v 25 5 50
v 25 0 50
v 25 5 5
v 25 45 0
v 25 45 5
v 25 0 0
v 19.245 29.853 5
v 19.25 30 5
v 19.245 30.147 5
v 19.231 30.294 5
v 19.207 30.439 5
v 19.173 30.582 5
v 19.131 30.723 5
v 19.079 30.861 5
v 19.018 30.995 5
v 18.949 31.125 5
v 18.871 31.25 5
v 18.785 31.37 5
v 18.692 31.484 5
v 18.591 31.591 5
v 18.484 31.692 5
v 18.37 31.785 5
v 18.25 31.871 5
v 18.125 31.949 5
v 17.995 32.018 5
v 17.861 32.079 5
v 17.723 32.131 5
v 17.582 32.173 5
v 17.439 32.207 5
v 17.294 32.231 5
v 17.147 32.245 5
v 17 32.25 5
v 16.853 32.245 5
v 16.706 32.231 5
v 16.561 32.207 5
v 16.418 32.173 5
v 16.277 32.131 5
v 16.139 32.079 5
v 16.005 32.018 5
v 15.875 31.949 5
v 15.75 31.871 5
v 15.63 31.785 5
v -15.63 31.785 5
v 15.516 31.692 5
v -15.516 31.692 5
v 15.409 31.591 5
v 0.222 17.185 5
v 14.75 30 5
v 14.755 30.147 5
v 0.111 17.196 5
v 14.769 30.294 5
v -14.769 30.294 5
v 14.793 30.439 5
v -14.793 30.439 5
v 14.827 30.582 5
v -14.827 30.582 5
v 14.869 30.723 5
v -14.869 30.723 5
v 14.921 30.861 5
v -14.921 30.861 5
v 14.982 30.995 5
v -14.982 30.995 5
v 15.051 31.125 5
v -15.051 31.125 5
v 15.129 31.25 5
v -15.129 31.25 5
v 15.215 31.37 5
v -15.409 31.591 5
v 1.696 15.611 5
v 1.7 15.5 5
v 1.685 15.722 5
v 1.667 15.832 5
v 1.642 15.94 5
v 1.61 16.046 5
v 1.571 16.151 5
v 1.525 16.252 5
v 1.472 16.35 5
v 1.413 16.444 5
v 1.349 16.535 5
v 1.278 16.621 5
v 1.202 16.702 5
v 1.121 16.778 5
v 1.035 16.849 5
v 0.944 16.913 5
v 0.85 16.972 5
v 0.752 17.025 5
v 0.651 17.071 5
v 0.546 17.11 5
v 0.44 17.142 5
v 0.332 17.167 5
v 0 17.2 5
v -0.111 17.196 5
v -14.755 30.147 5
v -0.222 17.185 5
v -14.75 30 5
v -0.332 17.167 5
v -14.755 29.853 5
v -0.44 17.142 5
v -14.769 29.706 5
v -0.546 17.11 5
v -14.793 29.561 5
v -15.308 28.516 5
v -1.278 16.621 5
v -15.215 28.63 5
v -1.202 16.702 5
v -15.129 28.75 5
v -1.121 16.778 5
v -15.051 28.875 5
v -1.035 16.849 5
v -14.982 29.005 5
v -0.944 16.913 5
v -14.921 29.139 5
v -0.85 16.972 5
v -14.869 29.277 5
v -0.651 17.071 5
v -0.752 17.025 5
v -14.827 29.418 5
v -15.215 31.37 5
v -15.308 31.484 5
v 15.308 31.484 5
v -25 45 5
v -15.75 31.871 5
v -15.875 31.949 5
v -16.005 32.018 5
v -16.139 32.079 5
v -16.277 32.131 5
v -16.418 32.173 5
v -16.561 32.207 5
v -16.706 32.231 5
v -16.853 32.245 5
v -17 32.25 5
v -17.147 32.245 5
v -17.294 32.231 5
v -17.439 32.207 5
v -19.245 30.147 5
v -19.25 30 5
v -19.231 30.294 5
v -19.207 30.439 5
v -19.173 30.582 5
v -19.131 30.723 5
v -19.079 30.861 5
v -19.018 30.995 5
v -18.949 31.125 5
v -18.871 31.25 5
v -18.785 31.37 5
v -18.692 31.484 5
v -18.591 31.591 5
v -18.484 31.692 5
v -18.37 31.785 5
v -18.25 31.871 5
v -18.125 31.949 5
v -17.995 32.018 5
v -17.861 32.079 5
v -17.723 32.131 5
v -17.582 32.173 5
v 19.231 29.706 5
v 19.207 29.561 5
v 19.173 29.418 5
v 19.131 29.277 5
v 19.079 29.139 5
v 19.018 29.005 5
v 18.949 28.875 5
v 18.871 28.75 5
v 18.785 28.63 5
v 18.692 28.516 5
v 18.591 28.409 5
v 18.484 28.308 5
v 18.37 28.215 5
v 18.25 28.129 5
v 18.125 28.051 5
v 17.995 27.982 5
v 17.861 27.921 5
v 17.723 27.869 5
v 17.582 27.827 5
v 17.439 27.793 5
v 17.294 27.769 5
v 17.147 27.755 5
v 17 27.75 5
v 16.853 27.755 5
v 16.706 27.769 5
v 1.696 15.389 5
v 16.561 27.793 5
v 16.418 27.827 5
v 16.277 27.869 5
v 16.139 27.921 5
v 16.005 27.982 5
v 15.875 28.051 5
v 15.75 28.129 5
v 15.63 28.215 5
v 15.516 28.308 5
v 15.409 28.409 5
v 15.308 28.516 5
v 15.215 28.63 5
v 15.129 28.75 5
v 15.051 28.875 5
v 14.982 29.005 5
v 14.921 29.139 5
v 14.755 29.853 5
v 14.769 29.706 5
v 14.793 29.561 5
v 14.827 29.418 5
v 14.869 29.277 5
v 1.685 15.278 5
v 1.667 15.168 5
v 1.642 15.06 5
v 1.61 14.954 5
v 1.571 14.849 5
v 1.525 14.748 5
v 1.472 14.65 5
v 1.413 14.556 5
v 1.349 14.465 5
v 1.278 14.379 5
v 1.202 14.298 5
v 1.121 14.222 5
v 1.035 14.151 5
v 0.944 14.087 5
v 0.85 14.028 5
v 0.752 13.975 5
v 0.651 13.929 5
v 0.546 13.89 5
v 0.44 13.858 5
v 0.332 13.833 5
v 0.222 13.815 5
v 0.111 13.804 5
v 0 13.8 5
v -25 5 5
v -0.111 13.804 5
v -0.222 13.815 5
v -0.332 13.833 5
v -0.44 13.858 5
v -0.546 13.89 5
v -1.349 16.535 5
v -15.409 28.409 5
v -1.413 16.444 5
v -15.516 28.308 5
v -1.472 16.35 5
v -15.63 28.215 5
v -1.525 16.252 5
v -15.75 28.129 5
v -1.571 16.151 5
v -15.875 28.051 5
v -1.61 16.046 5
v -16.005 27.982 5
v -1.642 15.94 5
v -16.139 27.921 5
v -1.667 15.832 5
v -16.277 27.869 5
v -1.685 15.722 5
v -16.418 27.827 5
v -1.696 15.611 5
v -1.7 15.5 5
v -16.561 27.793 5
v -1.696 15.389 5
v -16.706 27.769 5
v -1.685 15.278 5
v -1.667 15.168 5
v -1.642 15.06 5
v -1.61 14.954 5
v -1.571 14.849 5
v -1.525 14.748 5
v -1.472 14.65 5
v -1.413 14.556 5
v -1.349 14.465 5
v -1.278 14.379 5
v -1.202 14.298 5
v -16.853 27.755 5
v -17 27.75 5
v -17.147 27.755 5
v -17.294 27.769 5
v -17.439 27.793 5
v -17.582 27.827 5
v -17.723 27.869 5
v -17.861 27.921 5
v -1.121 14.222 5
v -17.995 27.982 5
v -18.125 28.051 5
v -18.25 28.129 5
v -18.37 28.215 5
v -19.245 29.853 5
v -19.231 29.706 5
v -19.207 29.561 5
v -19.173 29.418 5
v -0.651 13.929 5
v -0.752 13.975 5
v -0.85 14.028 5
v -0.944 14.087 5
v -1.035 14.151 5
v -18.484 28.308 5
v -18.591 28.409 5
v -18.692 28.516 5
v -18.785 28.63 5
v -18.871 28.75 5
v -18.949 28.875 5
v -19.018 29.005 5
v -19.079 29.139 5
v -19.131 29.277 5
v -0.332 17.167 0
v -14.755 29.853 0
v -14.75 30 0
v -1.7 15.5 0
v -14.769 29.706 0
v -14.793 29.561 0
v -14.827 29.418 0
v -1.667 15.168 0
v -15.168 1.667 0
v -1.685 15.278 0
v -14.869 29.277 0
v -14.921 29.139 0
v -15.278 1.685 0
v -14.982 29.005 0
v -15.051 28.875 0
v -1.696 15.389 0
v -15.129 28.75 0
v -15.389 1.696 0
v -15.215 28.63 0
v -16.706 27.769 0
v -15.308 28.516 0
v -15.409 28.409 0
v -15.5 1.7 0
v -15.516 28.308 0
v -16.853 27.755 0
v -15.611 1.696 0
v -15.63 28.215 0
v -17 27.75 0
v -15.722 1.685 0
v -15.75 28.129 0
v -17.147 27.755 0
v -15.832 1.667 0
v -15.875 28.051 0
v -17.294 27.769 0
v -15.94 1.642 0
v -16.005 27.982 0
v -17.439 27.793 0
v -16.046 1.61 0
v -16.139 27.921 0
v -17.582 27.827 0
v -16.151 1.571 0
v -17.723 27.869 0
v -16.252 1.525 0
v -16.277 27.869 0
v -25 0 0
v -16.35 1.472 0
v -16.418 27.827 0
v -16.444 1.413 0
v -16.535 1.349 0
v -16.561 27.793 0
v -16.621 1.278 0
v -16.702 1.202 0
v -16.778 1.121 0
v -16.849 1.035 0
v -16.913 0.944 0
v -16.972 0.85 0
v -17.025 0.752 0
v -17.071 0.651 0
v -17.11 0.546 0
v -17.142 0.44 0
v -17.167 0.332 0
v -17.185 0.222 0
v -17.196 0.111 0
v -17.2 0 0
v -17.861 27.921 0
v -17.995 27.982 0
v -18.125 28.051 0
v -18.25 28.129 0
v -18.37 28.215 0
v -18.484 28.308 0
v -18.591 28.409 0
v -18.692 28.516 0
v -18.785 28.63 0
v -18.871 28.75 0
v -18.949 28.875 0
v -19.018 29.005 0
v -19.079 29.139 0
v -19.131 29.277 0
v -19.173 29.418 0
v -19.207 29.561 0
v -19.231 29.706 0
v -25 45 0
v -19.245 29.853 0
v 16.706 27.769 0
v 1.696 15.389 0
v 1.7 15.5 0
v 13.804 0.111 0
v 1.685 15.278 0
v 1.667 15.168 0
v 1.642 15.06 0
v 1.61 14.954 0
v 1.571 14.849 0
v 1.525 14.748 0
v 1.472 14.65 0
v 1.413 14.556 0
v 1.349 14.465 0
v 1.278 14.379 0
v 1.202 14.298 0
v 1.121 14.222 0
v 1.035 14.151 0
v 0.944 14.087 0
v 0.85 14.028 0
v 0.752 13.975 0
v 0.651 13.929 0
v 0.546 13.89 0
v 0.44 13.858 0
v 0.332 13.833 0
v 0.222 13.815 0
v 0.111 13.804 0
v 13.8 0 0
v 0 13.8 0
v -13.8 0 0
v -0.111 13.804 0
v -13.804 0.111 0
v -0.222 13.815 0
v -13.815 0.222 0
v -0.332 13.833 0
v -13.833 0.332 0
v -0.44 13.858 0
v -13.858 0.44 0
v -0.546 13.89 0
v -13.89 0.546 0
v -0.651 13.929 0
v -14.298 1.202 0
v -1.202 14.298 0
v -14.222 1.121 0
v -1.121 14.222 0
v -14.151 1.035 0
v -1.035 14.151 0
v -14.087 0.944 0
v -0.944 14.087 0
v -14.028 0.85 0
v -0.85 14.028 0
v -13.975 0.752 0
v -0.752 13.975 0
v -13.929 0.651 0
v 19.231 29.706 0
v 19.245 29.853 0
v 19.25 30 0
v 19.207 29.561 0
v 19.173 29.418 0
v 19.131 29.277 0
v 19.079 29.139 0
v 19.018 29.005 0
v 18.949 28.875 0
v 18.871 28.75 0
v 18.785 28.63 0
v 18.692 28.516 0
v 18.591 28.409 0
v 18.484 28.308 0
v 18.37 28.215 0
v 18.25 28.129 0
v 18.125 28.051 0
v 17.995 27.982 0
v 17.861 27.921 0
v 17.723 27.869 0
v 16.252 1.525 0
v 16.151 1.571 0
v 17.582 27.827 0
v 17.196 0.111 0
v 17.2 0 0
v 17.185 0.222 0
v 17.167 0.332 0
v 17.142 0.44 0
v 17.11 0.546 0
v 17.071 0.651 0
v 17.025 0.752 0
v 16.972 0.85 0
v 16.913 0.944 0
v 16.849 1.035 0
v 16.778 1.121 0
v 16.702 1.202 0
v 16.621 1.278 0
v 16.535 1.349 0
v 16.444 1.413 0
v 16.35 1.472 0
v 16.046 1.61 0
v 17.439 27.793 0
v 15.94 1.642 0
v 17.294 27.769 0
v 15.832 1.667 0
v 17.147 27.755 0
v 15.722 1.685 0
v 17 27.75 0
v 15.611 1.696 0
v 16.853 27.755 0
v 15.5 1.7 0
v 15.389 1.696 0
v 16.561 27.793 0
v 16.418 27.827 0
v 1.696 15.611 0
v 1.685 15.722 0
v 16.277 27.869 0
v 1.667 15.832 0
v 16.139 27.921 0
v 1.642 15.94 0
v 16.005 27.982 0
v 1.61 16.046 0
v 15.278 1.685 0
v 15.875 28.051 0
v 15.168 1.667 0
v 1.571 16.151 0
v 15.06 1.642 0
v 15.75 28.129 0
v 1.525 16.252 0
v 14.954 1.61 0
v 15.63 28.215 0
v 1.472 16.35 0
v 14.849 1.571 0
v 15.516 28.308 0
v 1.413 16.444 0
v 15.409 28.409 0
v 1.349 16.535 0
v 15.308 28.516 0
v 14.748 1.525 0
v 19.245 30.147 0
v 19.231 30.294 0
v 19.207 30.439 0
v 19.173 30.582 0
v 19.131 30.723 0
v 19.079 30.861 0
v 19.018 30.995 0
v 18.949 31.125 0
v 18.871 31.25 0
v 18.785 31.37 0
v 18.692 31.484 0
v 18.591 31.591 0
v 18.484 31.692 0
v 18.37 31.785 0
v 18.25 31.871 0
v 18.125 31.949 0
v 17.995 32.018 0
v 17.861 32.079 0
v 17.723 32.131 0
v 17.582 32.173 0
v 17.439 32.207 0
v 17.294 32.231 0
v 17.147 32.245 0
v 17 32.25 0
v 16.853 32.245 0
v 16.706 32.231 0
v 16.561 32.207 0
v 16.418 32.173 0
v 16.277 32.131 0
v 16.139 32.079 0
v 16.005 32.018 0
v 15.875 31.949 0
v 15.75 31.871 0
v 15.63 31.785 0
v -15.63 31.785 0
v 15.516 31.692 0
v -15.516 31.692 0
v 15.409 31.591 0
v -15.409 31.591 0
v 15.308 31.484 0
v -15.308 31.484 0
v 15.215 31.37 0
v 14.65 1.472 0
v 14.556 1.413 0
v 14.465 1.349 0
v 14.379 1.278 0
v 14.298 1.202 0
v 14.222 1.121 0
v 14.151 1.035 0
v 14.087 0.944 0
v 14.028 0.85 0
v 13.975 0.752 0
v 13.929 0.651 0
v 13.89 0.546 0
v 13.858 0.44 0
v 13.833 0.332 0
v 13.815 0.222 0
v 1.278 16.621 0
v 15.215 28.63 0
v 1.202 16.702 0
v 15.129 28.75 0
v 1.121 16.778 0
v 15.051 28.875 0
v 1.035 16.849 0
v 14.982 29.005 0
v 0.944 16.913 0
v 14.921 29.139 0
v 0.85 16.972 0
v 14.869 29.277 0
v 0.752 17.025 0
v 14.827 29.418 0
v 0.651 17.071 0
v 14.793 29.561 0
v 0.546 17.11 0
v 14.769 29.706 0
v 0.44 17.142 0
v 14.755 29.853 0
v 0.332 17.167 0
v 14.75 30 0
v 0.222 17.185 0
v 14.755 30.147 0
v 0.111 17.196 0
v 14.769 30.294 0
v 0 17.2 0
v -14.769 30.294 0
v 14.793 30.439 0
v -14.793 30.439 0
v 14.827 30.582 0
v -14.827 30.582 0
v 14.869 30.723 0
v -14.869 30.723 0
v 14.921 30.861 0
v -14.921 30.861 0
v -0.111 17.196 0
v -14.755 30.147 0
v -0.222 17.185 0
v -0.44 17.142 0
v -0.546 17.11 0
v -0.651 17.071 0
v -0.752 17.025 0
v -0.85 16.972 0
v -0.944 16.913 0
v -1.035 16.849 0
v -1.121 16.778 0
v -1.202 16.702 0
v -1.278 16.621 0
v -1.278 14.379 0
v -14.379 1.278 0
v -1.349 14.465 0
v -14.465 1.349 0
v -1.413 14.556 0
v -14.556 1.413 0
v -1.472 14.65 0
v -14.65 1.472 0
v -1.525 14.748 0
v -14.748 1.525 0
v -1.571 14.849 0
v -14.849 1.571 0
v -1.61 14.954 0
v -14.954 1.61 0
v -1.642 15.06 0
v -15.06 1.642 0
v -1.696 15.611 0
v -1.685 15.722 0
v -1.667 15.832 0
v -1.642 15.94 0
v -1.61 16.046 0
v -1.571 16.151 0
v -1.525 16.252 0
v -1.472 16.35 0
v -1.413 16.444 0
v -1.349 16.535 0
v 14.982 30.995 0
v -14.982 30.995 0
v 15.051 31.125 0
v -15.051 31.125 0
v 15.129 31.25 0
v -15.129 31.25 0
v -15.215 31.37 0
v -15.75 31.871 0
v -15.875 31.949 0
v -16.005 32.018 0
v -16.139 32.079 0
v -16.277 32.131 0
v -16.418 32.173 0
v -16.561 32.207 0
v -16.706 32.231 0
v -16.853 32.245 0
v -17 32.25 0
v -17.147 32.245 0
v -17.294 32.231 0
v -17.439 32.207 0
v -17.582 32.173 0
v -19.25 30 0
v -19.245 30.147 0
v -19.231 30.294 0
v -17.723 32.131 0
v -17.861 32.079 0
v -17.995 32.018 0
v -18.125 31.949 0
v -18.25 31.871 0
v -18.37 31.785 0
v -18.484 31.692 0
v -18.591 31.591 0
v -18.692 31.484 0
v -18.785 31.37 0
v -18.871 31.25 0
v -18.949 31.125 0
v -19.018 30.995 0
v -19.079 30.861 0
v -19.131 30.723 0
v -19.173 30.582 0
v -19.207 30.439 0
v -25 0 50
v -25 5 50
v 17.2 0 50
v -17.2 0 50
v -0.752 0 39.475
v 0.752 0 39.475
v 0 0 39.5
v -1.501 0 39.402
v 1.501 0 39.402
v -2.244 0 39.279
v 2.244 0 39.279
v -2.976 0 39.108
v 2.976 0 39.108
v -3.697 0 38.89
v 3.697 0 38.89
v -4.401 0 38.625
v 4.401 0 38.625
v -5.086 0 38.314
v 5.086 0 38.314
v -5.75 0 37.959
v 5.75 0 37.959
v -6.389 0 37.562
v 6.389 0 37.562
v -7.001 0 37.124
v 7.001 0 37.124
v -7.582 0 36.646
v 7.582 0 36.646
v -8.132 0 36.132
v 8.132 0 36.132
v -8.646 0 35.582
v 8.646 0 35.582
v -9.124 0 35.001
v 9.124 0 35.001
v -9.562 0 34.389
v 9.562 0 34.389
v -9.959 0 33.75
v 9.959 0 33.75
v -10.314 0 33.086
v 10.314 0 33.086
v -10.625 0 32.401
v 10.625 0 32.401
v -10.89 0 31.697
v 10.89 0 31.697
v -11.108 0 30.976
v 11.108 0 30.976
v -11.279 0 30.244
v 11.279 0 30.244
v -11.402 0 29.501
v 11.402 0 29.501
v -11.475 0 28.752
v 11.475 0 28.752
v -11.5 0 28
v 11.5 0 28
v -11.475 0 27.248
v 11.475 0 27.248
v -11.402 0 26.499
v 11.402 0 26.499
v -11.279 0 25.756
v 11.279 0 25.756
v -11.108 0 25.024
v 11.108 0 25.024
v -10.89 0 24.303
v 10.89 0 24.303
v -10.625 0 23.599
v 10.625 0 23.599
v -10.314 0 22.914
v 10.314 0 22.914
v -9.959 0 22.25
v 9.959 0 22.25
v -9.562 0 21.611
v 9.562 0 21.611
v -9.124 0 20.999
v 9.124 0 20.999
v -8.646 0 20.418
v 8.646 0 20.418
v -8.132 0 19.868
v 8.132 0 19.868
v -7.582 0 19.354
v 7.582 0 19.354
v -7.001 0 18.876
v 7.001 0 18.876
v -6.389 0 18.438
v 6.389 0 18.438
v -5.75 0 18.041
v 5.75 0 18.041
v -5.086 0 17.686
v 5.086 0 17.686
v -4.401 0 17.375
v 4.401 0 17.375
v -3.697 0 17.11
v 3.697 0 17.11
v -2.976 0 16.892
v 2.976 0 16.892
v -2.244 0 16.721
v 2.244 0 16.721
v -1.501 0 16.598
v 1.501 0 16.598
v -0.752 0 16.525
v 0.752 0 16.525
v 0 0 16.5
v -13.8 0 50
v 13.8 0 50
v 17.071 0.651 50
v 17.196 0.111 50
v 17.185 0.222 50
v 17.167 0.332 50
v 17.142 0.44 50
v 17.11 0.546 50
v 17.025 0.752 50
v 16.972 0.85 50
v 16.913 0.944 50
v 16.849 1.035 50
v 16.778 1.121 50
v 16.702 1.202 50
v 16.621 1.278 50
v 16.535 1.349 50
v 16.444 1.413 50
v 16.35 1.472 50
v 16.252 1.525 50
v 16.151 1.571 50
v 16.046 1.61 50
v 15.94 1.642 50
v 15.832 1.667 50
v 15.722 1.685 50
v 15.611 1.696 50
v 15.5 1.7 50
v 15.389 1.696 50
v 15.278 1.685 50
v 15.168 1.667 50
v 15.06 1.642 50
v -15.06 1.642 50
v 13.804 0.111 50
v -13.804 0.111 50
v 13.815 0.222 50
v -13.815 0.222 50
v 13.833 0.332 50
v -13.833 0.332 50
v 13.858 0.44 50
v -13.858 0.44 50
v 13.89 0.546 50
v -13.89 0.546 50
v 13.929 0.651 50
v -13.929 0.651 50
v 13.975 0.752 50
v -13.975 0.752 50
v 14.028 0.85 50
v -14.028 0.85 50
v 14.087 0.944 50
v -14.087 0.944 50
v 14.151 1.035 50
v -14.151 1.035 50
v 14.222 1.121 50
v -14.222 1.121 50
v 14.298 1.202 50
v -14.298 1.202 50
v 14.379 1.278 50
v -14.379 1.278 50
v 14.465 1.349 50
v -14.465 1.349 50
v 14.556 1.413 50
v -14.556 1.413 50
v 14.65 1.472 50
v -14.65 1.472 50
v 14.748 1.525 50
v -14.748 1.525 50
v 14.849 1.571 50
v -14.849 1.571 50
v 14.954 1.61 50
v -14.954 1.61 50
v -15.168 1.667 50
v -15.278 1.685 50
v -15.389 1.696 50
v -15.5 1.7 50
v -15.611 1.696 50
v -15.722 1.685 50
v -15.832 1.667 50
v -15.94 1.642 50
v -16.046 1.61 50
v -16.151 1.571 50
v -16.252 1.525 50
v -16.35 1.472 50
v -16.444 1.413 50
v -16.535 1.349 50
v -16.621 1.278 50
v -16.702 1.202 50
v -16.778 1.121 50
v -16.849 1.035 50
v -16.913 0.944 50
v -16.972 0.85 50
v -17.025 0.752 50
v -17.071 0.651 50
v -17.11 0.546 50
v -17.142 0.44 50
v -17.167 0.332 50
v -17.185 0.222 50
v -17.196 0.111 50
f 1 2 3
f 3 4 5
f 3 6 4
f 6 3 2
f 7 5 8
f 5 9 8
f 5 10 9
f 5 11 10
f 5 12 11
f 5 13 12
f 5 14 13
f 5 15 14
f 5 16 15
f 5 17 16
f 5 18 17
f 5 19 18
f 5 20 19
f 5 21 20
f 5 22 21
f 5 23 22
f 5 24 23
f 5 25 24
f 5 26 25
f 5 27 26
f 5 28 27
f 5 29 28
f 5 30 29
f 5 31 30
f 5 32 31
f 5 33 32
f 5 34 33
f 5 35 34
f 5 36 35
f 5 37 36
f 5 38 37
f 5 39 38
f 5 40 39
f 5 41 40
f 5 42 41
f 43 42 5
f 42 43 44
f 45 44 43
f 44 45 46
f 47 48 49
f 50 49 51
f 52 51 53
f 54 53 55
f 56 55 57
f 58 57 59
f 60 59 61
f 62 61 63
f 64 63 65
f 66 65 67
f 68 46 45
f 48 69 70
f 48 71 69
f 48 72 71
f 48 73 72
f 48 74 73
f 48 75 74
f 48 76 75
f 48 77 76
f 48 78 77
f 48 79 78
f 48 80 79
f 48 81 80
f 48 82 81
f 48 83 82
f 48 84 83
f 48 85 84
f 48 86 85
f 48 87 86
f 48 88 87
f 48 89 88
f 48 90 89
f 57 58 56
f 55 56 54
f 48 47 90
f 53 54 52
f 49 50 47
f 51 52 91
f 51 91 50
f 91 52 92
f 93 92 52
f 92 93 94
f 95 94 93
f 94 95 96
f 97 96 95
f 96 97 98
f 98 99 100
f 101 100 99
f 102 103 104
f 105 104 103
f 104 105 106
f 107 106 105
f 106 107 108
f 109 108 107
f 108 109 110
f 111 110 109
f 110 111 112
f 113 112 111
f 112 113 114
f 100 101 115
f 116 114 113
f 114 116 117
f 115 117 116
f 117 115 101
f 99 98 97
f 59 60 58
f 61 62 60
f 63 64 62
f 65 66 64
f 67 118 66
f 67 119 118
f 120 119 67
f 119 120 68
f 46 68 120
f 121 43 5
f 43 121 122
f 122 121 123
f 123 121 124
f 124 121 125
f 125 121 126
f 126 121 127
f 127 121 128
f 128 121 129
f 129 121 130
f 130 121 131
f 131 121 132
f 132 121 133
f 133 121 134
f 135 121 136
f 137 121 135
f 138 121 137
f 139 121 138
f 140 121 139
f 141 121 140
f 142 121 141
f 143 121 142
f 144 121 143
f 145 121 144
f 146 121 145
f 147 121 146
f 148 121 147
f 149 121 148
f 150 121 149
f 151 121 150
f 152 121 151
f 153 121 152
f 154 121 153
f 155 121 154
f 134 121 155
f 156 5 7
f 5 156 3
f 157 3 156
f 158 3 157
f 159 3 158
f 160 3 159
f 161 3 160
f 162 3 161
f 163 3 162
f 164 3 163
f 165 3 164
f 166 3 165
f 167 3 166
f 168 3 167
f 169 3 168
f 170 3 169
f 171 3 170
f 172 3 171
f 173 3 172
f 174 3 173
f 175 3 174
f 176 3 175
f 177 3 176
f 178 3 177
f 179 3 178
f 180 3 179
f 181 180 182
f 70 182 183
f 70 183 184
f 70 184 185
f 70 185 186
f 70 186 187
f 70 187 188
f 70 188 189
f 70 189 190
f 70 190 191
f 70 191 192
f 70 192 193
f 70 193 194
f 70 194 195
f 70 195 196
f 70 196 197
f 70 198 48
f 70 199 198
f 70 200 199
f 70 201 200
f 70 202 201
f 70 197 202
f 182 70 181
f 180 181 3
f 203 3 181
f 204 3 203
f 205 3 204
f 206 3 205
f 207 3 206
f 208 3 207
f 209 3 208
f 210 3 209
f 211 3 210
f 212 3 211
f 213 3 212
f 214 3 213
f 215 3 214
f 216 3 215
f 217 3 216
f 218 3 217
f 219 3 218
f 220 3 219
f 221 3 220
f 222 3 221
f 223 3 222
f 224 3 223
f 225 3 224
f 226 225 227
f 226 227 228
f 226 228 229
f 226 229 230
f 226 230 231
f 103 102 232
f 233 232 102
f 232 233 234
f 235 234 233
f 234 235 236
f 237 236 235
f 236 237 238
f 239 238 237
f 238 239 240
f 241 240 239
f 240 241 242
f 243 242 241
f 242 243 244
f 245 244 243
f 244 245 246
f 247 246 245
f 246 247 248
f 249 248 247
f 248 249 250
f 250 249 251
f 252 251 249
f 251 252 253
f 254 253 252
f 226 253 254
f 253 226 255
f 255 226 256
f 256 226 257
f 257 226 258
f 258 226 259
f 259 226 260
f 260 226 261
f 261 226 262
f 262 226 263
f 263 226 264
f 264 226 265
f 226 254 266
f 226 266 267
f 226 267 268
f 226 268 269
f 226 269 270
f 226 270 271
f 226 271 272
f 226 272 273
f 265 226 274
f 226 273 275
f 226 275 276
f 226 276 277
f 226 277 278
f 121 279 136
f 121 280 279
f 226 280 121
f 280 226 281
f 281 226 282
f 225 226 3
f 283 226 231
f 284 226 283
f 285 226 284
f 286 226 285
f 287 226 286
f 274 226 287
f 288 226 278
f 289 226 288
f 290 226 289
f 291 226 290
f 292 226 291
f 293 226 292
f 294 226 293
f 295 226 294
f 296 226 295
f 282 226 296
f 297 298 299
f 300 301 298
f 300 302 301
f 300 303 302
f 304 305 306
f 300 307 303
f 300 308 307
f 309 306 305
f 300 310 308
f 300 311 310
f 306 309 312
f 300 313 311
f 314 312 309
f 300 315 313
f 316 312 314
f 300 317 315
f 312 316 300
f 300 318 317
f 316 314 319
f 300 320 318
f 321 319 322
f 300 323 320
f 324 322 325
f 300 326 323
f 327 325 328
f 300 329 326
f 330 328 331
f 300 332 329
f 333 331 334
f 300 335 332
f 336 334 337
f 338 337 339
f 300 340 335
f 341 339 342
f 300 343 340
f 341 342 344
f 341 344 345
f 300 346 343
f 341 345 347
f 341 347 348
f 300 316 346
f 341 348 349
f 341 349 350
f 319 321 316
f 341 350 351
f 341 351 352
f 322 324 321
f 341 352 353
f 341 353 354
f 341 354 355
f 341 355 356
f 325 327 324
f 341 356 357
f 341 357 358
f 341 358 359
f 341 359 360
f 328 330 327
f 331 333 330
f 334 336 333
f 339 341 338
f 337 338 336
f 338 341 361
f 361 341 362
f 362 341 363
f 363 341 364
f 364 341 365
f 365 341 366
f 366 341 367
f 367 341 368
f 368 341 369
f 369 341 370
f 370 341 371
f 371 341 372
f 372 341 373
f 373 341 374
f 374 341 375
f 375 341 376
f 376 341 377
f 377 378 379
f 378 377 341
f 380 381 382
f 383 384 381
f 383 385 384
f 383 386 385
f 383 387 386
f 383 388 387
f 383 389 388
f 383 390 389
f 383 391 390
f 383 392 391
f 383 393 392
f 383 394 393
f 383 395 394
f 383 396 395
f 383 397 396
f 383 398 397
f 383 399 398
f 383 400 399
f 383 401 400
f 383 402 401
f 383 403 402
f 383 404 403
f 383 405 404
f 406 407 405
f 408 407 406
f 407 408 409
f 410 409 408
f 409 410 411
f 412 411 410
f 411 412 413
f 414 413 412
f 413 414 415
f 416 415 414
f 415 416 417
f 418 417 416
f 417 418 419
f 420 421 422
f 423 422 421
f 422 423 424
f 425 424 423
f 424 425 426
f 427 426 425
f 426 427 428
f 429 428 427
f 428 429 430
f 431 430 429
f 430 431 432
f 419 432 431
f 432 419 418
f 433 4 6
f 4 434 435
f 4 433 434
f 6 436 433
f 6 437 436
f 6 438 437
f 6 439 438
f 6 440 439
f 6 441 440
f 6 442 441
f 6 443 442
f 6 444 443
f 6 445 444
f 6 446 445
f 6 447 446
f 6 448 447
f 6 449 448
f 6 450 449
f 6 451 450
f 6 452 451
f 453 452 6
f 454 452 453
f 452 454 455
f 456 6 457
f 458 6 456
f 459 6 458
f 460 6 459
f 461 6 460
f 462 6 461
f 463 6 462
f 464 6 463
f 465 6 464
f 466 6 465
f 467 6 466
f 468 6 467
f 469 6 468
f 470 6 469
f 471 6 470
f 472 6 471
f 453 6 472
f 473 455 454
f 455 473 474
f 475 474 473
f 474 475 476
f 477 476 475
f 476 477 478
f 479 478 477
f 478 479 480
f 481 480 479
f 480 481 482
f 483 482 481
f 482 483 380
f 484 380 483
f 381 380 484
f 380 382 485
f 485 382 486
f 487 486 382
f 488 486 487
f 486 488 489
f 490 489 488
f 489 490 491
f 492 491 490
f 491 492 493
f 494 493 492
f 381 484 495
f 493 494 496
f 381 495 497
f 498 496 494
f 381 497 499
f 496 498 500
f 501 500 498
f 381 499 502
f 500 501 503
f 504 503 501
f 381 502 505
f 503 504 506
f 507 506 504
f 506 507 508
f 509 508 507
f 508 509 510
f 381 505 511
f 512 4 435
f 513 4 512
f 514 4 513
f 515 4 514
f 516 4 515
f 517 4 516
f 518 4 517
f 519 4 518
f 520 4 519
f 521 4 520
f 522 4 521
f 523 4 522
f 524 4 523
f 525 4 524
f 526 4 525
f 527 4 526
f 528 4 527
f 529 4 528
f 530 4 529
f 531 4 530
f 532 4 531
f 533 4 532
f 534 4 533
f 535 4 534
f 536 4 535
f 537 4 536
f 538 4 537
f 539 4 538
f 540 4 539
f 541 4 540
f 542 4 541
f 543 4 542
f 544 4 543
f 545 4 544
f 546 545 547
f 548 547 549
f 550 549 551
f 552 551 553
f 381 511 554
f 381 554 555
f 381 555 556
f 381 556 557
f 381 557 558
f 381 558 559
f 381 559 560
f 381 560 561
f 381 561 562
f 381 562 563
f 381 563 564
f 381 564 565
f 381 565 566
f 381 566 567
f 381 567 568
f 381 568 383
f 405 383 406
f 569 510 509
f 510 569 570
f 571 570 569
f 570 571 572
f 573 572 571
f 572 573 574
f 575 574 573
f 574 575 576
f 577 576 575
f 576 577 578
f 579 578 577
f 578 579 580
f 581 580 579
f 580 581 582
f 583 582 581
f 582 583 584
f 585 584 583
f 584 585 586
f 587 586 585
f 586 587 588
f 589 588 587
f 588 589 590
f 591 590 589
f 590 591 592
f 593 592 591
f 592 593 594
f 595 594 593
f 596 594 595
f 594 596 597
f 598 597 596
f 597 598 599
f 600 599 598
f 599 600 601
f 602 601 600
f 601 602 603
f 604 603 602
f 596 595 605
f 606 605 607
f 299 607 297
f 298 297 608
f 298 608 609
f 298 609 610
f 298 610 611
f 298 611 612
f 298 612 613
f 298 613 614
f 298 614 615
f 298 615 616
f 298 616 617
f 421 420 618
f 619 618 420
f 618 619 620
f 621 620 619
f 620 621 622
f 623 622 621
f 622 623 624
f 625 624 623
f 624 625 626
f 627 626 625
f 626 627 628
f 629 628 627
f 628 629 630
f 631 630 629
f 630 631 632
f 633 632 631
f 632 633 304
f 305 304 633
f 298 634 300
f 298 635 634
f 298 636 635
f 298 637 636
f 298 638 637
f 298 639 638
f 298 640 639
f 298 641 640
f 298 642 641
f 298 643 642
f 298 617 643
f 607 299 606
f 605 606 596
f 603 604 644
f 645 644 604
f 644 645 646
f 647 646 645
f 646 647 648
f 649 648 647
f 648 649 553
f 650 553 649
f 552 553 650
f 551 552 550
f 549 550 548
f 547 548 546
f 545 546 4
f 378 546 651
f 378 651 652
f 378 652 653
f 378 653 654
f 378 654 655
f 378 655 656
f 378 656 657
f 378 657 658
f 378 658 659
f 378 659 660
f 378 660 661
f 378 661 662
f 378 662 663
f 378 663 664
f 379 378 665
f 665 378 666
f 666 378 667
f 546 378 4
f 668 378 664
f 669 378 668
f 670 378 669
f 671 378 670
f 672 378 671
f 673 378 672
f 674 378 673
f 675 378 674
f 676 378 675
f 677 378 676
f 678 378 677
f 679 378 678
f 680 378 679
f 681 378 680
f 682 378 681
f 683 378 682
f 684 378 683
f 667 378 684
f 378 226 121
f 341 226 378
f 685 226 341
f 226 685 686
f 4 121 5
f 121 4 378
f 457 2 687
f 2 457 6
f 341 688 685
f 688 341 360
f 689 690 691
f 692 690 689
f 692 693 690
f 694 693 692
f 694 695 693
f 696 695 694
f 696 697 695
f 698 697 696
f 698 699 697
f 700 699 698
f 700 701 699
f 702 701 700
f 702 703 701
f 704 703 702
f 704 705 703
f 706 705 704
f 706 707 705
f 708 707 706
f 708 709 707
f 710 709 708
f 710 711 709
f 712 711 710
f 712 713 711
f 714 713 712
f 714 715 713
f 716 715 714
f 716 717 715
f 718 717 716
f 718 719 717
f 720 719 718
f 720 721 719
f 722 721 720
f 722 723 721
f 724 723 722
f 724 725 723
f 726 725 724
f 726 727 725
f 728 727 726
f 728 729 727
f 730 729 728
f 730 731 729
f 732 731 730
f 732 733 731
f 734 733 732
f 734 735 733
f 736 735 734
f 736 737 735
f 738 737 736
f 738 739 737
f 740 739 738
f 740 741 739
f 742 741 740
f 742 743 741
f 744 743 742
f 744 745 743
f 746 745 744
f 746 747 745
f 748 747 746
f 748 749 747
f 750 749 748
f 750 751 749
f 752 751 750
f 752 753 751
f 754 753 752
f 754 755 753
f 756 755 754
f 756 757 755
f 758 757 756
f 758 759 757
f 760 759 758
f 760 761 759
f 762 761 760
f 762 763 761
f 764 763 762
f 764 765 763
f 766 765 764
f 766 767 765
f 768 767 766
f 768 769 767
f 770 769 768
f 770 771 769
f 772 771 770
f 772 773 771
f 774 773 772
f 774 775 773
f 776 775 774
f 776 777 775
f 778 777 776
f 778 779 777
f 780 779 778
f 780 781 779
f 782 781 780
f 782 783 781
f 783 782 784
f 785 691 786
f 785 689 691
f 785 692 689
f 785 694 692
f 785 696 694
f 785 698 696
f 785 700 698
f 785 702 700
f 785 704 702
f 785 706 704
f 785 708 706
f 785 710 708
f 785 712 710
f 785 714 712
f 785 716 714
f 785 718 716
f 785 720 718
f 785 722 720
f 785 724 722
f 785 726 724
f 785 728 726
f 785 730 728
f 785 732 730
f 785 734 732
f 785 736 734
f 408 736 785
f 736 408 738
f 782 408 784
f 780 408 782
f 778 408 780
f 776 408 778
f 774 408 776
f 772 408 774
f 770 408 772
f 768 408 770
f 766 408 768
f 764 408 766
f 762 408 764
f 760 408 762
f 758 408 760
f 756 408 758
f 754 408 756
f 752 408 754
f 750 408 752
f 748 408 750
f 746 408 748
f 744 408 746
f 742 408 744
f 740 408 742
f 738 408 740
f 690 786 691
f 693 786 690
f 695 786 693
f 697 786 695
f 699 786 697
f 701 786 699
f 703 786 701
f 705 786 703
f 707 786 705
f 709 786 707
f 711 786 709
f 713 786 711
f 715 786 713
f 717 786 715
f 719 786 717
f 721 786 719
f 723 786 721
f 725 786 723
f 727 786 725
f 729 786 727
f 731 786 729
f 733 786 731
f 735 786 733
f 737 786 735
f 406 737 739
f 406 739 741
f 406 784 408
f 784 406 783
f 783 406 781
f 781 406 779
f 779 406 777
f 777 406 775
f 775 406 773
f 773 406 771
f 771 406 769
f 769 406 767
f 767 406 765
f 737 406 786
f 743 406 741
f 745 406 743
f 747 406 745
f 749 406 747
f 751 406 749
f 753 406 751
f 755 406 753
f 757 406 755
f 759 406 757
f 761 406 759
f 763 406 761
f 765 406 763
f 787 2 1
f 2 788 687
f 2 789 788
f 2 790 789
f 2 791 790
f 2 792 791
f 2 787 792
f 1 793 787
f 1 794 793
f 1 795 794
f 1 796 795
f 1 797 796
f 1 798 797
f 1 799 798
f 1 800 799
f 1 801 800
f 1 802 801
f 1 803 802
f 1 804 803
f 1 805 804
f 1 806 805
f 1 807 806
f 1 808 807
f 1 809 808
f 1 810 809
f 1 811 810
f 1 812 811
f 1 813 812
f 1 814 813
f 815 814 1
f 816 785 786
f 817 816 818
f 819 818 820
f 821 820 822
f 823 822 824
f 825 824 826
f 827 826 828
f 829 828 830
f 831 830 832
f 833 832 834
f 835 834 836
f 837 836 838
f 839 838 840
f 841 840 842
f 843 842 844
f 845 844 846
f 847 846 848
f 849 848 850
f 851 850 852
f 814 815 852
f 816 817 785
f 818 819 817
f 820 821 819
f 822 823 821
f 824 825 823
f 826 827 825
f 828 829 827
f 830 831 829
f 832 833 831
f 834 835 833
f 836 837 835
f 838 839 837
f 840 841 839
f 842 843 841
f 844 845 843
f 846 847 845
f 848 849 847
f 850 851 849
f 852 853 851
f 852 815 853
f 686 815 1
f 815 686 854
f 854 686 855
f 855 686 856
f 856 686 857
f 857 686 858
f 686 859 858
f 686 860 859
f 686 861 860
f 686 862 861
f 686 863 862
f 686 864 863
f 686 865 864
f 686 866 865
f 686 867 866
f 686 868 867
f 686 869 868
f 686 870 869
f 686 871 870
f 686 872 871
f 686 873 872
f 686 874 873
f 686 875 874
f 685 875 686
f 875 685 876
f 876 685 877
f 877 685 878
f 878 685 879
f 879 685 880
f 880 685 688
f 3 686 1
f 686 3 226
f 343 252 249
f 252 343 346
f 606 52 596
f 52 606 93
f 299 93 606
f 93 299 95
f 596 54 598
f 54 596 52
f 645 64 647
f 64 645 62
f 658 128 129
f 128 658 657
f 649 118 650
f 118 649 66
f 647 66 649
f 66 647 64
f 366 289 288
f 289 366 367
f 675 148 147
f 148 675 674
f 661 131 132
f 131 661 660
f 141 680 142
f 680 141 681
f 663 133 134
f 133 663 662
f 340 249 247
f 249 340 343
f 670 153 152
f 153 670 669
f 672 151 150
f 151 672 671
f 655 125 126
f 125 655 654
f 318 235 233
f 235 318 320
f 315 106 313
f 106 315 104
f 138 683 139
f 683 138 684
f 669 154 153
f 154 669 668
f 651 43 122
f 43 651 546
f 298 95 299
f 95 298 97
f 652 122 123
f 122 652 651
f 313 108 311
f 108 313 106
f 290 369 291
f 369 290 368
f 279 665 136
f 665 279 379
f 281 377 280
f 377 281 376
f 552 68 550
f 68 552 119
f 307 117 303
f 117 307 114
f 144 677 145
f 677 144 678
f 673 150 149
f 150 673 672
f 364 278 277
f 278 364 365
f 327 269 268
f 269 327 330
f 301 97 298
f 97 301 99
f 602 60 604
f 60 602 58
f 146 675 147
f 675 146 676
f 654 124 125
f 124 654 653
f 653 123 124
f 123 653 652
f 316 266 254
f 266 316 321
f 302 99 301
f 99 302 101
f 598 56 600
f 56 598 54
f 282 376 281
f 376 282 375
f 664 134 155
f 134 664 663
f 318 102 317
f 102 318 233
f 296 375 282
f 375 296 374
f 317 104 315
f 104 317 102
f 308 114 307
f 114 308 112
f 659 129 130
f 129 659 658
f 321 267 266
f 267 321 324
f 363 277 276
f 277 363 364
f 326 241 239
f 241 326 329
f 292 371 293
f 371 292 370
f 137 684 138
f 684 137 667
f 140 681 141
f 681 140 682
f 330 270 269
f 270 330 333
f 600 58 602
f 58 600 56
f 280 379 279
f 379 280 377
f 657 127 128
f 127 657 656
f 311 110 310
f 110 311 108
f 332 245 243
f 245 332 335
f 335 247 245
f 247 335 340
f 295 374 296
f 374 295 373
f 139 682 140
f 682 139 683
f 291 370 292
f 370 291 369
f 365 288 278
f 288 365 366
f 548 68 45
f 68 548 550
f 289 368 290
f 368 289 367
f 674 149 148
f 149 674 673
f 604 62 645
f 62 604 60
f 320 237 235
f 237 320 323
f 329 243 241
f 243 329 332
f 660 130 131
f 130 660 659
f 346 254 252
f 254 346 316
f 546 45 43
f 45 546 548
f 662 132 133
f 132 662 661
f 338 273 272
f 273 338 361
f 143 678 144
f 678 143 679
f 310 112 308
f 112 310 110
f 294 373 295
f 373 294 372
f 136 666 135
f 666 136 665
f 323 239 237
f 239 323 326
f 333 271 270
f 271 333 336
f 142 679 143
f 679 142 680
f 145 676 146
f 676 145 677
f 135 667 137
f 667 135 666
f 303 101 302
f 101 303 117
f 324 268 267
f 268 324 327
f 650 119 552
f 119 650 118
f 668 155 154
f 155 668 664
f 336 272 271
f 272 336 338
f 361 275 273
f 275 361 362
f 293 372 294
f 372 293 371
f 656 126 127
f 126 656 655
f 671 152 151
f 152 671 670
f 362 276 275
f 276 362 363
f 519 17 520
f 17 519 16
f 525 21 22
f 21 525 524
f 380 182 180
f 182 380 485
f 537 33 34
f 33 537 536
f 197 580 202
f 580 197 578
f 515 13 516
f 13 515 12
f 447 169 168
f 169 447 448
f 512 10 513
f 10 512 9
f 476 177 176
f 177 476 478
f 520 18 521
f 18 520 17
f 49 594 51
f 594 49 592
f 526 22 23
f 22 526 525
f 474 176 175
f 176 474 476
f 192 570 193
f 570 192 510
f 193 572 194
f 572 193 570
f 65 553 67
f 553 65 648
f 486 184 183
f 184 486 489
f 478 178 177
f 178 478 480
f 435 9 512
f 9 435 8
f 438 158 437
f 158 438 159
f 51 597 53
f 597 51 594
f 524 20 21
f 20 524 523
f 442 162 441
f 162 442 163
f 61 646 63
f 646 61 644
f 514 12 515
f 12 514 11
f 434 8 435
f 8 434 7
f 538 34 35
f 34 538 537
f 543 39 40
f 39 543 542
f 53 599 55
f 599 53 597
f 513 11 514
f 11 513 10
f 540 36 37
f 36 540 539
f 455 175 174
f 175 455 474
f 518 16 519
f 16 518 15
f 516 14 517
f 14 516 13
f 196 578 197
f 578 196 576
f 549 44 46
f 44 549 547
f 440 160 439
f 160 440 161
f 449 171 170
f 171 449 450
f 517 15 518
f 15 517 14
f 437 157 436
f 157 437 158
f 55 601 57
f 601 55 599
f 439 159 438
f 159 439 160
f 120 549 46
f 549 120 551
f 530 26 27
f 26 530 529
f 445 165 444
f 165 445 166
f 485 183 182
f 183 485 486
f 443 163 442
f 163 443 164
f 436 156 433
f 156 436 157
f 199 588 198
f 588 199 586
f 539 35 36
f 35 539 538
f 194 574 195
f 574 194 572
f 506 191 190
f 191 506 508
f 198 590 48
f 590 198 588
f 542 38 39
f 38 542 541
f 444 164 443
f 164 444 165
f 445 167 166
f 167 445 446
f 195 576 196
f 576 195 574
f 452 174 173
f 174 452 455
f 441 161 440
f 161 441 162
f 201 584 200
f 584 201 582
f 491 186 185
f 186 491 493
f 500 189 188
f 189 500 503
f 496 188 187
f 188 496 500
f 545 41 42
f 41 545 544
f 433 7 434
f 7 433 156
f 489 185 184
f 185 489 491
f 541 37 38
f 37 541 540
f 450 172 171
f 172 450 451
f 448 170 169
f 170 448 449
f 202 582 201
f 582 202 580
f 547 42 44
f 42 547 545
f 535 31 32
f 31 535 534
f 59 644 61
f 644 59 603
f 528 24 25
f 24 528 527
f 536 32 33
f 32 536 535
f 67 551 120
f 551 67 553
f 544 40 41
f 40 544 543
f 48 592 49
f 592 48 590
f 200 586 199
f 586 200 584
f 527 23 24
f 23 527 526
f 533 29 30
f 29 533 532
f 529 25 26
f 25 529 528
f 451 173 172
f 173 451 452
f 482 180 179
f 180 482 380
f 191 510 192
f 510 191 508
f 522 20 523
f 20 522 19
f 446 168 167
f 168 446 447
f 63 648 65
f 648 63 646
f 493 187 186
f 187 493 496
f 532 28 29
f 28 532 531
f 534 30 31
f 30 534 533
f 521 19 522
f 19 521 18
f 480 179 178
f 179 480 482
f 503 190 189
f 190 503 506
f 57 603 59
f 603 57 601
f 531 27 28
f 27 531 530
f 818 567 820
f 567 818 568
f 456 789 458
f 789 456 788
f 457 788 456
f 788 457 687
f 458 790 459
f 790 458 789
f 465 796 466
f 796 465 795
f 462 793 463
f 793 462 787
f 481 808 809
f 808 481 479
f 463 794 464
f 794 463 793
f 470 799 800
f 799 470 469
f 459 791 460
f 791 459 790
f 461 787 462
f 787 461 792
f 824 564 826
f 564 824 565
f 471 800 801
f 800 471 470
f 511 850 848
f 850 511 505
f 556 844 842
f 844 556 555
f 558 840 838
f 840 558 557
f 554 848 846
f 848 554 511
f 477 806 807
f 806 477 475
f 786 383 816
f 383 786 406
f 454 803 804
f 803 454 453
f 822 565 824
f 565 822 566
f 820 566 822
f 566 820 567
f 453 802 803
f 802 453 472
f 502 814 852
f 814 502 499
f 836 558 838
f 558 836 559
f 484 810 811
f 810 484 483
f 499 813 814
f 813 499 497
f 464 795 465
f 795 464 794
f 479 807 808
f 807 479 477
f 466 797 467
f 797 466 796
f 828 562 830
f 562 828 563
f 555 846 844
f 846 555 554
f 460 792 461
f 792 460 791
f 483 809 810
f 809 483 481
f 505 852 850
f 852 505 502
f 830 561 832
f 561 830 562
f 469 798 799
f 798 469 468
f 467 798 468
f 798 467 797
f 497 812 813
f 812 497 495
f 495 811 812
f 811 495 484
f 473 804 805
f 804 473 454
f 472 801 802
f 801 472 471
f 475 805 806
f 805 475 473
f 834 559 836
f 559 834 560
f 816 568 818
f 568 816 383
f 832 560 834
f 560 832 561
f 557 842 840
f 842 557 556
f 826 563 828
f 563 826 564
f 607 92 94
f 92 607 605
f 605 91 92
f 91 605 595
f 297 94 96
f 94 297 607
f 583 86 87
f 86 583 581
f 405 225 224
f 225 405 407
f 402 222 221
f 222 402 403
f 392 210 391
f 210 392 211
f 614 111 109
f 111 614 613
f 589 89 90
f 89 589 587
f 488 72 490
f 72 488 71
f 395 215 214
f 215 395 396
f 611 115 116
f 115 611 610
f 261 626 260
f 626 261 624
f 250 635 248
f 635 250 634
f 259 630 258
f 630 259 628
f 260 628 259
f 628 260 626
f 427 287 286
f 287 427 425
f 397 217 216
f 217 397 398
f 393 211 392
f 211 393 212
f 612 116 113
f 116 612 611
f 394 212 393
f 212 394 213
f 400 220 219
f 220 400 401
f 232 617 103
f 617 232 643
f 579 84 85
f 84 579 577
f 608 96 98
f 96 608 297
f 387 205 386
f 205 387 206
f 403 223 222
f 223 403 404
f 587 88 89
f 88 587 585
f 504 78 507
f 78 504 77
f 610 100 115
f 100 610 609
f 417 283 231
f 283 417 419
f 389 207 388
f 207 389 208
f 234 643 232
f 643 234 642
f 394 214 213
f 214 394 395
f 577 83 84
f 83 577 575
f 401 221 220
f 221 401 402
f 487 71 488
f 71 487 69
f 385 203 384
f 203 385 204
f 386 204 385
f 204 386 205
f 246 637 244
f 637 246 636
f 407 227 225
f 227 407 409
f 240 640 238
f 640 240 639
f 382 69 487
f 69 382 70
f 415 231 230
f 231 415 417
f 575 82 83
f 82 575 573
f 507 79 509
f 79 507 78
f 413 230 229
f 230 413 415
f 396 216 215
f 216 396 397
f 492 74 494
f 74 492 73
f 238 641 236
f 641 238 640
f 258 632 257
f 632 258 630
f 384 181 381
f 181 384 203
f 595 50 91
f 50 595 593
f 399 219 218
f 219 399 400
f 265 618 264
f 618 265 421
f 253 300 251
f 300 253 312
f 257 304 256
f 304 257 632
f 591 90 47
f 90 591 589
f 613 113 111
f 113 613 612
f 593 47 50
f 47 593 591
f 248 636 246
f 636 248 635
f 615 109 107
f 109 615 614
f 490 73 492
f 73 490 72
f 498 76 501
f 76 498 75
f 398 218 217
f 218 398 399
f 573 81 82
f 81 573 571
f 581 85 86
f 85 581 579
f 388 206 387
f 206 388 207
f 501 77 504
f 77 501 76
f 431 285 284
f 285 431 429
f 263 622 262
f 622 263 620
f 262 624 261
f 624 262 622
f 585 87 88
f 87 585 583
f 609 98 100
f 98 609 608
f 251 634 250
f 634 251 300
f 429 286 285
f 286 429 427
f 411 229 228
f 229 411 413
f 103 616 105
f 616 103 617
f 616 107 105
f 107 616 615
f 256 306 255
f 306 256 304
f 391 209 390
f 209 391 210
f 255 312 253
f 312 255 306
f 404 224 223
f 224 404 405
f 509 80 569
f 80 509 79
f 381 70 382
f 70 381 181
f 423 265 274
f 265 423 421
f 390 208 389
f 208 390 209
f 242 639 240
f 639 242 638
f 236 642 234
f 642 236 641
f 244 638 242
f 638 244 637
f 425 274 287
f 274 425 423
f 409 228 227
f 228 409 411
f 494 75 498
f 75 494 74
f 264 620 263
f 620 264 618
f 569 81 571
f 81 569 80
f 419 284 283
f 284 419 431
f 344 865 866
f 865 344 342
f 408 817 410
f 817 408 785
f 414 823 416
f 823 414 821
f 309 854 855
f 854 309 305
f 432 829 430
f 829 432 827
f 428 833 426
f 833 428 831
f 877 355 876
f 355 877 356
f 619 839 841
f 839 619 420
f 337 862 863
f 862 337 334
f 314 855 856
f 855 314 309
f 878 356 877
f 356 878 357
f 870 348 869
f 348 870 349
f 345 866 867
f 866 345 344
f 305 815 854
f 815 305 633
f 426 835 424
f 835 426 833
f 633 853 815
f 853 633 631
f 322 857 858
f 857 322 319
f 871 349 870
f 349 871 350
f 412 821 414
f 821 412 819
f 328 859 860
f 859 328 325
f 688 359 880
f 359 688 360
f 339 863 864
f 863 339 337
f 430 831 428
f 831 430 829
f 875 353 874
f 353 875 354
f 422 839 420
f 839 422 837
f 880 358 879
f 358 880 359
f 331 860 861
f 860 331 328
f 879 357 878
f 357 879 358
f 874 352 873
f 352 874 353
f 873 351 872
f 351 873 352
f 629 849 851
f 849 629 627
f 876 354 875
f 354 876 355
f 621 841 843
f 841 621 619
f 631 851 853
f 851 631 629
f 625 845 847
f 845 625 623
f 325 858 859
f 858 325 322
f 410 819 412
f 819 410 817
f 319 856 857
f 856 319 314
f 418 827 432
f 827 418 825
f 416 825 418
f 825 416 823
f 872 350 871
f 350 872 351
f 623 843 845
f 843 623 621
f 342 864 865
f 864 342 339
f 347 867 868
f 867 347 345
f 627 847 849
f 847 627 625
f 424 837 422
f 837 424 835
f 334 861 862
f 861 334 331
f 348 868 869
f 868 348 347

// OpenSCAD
// L-shaped mounting bracket for a NEMA 17 stepper motor (e.g. syringe pump)
// Print orientation: base plate on the bed (z = 0), motor plate builds upward.

// ---------------- Parameters ----------------
base_x0      = -25;    // base plate, x start
base_x1      = 25;     // base plate, x end
base_y0      = 0;      // base plate, y start
base_y1      = 45;     // base plate, y end
base_z0      = 0;      // base plate, z start
base_z1      = 5;      // base plate, z end

motor_x0     = -25;    // motor plate, x start
motor_x1     = 25;     // motor plate, x end
motor_y0     = 0;      // motor plate, y start
motor_y1     = 5;      // motor plate, y end (stands on back edge of base)
motor_z0     = 0;      // motor plate, z start
motor_z1     = 50;     // motor plate, z end

hole_m4_x1   = -17;    // M4 through-hole in base, x
hole_m4_y1   = 30;     // M4 through-hole in base, y
hole_m4_x2   = 17;     // M4 through-hole in base, x
hole_m4_y2   = 30;     // M4 through-hole in base, y
hole_m4_d    = 4.5;    // M4 hole diameter

boss_d       = 23;     // motor centring boss hole diameter
boss_x       = 0;      // boss hole centre, x
boss_z       = 28;     // boss hole centre, z

screw_d      = 3.4;    // M3 screw hole diameter
screw_pitch  = 31;     // square pattern side length for screws
screw_count  = 4;      // number of screw holes

gusset_t     = 5;      // gusset thickness (X)
gusset_leg   = 20;     // right-triangle leg length (Y and Z)
gusset_x0    = -25;    // left gusset, x start
gusset_x1    = -20;    // left gusset, x end
gusset_r     = 5;      // right gusset, x start
gusset_x2    = 25;     // right gusset, x end

eps          = 0.5;    // cutter overshoot past faces

$fn = 96;

// ---------------- Model ----------------
difference() {
    union() {
        // Base plate
        translate([base_x0, base_y0, base_z0])
            cube([base_x1 - base_x0, base_y1 - base_y0, base_z1 - base_z0]);

        // Vertical motor plate
        translate([motor_x0, motor_y0, motor_z0])
            cube([motor_x1 - motor_x0, motor_y1 - motor_y0, motor_z1 - motor_z0]);

        // Left gusset: right triangle in YZ, legs along +Y and +Z
        translate([gusset_x0, 0, 0])
            linear_extrude(height = gusset_t)
                polygon(points = [
                    [gusset_x1, 5, 5],
                    [gusset_x1, 5 + gusset_leg, 5],
                    [gusset_x1, 5, 5 + gusset_leg]
                ]);

        // Right gusset: right triangle in YZ, legs along +Y and +Z
        translate([gusset_r, 0, 0])
            linear_extrude(height = gusset_t)
                polygon(points = [
                    [gusset_x2, 5, 5],
                    [gusset_x2, 5 + gusset_leg, 5],
                    [gusset_x2, 5, 5 + gusset_leg]
                ]);
    }

    // Base plate M4 through-holes
    for (i = [1, 2])
        translate([i == 1 ? hole_m4_x1 : hole_m4_x2, hole_m4_y1, -eps])
            cylinder(d = hole_m4_d, h = base_z1 - base_z0 + 2 * eps);

    // Motor boss hole (along Y)
    translate([boss_x, 0, boss_z])
        rotate([90, 0, 0])
            cylinder(d = boss_d, h = motor_y1 - motor_y0 + 2 * eps);

    // M3 screw holes on a square pattern centred on the boss hole
    for (a = [0, 90, 180, 270])
        rotate([0, 0, a])
            translate([screw_pitch / 2, 0, 0])
                cylinder(d = screw_d, h = motor_z1 - motor_z0 + eps);
}
